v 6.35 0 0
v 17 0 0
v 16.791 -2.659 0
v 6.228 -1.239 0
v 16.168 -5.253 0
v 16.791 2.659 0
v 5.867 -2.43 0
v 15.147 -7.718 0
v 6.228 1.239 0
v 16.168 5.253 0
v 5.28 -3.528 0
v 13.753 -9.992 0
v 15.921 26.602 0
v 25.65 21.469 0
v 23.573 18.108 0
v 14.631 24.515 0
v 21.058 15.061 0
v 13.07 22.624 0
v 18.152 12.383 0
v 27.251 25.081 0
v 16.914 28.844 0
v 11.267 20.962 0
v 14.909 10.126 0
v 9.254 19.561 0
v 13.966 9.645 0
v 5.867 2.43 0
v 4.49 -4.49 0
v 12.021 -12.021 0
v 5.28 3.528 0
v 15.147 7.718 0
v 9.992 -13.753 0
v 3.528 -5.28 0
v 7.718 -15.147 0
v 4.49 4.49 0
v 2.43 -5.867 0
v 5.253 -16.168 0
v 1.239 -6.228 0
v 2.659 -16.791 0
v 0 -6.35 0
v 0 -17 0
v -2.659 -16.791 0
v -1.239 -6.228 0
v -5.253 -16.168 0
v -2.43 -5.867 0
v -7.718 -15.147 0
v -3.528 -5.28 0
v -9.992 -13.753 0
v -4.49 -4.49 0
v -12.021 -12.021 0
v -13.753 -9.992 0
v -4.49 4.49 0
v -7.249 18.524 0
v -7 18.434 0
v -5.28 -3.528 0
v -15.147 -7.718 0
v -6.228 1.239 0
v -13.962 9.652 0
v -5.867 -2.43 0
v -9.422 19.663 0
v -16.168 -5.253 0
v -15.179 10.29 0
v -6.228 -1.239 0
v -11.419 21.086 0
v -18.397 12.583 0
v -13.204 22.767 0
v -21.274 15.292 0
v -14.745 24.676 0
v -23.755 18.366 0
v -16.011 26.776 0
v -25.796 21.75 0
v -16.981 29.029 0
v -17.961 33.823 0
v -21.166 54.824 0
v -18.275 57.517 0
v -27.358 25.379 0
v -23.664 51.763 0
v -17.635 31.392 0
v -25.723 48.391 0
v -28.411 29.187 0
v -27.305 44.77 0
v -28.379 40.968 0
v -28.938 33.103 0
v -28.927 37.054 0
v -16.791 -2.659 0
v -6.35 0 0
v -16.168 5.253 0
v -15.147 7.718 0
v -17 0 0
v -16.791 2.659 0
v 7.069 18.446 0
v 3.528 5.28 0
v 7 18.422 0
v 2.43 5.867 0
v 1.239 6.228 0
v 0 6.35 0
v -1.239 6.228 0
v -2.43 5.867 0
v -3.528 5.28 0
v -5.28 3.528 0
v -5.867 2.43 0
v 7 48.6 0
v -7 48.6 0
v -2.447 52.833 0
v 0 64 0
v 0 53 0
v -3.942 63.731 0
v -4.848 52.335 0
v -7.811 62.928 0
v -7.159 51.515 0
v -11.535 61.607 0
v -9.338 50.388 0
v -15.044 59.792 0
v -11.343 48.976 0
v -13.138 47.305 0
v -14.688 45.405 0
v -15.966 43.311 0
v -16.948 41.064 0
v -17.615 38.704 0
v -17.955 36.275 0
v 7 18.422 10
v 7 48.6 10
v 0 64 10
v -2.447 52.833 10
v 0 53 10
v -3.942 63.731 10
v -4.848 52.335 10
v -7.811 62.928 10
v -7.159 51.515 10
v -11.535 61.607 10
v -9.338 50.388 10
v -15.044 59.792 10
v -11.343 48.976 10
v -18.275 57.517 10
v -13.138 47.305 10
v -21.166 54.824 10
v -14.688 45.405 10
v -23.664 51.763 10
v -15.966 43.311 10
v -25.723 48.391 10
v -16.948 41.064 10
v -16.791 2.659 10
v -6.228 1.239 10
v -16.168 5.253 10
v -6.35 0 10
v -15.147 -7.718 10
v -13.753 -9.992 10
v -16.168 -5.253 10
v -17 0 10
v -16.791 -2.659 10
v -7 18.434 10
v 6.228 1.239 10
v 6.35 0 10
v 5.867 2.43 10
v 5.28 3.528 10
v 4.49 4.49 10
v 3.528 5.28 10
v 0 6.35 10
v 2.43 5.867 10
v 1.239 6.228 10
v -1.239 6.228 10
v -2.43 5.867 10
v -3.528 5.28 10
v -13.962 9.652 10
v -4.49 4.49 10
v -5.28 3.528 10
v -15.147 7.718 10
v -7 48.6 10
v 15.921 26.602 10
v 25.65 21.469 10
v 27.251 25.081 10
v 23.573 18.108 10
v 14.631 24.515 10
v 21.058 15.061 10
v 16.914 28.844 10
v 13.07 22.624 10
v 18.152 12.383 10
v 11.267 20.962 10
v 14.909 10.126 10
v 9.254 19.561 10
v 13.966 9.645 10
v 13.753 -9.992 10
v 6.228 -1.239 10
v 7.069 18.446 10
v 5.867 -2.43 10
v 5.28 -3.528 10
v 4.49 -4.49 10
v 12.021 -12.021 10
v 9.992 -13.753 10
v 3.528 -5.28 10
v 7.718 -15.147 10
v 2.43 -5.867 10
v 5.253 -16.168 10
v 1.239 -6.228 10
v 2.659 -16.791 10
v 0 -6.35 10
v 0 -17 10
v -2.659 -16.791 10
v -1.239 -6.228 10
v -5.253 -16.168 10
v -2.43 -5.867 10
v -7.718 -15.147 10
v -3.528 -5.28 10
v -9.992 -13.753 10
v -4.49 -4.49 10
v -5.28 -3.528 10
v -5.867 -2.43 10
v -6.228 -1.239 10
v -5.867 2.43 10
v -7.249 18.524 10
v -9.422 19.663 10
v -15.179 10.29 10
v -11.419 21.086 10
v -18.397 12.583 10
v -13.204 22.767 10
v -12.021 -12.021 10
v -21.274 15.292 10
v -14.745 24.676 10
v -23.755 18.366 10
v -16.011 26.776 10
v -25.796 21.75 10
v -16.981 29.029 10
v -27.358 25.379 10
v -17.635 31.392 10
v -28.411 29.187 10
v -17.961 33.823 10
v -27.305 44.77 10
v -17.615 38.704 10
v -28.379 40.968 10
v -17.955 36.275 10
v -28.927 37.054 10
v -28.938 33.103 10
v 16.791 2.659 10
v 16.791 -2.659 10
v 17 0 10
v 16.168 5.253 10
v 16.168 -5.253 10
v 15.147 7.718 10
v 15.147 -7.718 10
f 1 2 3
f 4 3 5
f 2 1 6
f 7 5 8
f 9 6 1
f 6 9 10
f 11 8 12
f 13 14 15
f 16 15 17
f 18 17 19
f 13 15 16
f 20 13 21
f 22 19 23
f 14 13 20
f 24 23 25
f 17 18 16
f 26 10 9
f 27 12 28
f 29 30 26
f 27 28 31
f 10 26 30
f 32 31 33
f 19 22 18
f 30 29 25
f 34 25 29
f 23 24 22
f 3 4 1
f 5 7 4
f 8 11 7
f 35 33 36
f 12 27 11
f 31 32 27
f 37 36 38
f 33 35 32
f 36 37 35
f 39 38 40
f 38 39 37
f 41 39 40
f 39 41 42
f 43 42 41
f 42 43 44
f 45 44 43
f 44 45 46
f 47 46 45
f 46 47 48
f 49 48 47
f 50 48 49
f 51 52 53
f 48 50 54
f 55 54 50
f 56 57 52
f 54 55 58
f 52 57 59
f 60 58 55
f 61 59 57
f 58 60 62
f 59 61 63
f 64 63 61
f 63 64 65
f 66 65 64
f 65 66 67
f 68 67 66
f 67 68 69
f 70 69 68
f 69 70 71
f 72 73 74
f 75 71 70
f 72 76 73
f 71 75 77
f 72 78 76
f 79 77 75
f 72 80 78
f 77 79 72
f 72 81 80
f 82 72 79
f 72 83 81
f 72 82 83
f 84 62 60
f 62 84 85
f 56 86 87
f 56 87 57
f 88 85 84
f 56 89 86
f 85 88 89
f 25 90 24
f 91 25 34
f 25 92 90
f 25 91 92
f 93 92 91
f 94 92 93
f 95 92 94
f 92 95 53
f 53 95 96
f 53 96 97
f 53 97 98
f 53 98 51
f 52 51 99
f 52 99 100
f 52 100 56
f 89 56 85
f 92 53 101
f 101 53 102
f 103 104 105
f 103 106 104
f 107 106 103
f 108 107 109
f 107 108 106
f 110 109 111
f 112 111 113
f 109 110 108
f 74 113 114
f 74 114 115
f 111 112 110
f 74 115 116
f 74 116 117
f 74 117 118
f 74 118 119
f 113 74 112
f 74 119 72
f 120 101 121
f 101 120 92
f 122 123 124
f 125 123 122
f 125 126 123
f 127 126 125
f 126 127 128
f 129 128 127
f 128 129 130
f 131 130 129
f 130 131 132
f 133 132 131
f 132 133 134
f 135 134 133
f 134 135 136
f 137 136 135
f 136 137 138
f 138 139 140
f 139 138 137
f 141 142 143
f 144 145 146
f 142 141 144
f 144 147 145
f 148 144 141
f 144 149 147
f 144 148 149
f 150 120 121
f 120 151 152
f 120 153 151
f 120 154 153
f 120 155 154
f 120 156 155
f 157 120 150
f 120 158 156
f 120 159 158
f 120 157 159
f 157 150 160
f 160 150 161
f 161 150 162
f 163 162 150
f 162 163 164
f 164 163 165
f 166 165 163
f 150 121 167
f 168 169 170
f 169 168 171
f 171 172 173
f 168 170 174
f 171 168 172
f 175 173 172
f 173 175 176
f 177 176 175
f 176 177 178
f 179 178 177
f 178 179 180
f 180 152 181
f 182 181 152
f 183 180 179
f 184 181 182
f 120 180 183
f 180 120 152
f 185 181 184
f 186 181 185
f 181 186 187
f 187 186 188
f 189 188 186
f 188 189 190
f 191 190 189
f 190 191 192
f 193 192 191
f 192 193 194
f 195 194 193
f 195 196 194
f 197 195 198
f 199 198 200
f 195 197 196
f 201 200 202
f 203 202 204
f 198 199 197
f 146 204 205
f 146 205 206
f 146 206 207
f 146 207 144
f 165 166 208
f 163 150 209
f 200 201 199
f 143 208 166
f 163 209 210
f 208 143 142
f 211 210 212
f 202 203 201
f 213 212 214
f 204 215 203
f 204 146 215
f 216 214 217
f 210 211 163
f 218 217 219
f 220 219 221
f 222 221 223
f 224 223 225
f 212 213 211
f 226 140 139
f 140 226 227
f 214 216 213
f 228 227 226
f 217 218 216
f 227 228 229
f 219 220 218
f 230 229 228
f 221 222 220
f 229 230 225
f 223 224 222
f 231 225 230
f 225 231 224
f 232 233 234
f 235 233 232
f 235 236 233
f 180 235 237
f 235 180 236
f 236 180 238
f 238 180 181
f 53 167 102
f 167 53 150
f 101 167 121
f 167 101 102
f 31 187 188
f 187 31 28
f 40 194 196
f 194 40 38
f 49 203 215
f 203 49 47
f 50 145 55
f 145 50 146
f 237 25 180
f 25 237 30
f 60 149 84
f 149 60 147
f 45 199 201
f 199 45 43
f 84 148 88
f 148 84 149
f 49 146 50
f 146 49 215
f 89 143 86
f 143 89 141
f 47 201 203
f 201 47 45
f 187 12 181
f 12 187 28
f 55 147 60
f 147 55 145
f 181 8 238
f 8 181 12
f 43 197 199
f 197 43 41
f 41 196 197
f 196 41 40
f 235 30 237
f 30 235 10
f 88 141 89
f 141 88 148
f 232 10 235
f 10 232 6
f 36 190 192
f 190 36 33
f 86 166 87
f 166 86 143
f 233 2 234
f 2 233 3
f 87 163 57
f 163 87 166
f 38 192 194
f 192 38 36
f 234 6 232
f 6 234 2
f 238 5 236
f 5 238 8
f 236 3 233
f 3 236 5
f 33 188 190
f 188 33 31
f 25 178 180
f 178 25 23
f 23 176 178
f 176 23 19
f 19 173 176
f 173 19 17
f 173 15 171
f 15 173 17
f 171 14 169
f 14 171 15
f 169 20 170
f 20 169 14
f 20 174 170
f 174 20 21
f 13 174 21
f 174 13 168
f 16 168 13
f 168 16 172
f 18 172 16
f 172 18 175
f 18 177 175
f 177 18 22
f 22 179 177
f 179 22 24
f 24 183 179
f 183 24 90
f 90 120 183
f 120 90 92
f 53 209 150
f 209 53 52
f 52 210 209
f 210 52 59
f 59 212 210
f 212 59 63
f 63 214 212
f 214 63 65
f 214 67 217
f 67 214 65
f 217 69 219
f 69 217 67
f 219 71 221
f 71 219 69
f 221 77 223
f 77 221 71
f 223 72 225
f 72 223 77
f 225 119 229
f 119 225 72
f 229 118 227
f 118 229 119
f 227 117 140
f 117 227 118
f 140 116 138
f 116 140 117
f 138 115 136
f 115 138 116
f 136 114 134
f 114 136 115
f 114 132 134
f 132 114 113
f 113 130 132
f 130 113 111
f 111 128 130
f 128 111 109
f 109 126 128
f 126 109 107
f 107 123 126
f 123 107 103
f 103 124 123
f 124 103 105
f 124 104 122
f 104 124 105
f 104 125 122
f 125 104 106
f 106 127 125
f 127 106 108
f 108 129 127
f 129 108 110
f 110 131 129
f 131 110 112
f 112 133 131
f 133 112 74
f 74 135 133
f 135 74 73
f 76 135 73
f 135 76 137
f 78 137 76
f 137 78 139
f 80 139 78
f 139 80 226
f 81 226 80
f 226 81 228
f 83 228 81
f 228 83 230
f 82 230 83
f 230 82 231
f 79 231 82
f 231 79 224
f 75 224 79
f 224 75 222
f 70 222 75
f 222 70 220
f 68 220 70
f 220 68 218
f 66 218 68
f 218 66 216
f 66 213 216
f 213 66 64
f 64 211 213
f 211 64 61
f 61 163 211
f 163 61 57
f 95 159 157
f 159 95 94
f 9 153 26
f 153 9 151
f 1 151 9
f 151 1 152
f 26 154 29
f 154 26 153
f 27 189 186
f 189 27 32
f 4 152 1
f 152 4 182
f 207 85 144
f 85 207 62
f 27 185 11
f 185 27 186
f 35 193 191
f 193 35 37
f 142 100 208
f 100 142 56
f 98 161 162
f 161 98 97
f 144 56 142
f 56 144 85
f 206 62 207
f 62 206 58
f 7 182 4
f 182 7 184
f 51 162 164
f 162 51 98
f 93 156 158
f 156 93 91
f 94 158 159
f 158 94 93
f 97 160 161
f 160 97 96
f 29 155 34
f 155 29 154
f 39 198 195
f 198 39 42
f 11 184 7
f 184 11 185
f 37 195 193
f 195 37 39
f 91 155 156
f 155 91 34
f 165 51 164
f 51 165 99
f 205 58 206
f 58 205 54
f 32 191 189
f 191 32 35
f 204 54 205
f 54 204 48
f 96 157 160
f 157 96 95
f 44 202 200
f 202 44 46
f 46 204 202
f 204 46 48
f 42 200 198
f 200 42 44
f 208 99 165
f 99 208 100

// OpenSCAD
$fn = 32;

// ----------------------------------------------------------------------
// Hook: 70 mm shank into a 18 mm curl, 10 mm thick
// ----------------------------------------------------------------------

// --- parameters (mm) ---
shank_len = 70;           // shank length from the boss centre
shank_w = 14;             // shank width
boss_d = 34;              // boss diameter
bore_d = 12.7;            // boss bore
curl_in = 18;             // curl inner radius
curl_out = 29;            // curl outer radius
curl_sweep = 250;         // curl sweep angle
hook_t = 10;              // hook thickness

shank_profile = [[-7, 48.6], [7, 48.6], [7, 15], [-7, 15]];
boss_profile = [[17, 0], [16.791, 2.659], [16.168, 5.253], [15.147, 7.718], [13.753, 9.992], [12.021, 12.021], [9.992, 13.753], [7.718, 15.147], [5.253, 16.168], [2.659, 16.791], [0, 17], [-2.659, 16.791], [-5.253, 16.168], [-7.718, 15.147], [-9.992, 13.753], [-12.021, 12.021], [-13.753, 9.992], [-15.147, 7.718], [-16.168, 5.253], [-16.791, 2.659], [-17, 0], [-16.791, -2.659], [-16.168, -5.253], [-15.147, -7.718], [-13.753, -9.992], [-12.021, -12.021], [-9.992, -13.753], [-7.718, -15.147], [-5.253, -16.168], [-2.659, -16.791], [0, -17], [2.659, -16.791], [5.253, -16.168], [7.718, -15.147], [9.992, -13.753], [12.021, -12.021], [13.753, -9.992], [15.147, -7.718], [16.168, -5.253], [16.791, -2.659]];
curl_profile = [[0, 64], [-3.942, 63.731], [-7.811, 62.928], [-11.535, 61.607], [-15.044, 59.792], [-18.275, 57.517], [-21.166, 54.824], [-23.664, 51.763], [-25.723, 48.391], [-27.305, 44.77], [-28.379, 40.968], [-28.927, 37.054], [-28.938, 33.103], [-28.411, 29.187], [-27.358, 25.379], [-25.796, 21.75], [-23.755, 18.366], [-21.274, 15.292], [-18.397, 12.583], [-15.179, 10.29], [-11.68, 8.456], [-7.963, 7.115], [-4.099, 6.291], [-0.158, 6], [3.785, 6.248], [7.658, 7.03], [11.389, 8.33], [14.909, 10.126], [18.152, 12.383], [21.058, 15.061], [23.573, 18.108], [25.65, 21.469], [27.251, 25.081], [16.914, 28.844], [15.921, 26.602], [14.631, 24.515], [13.07, 22.624], [11.267, 20.962], [9.254, 19.561], [7.069, 18.446], [4.754, 17.639], [2.349, 17.154], [-0.098, 17], [-2.544, 17.181], [-4.943, 17.692], [-7.249, 18.524], [-9.422, 19.663], [-11.419, 21.086], [-13.204, 22.767], [-14.745, 24.676], [-16.011, 26.776], [-16.981, 29.029], [-17.635, 31.392], [-17.961, 33.823], [-17.955, 36.275], [-17.615, 38.704], [-16.948, 41.064], [-15.966, 43.311], [-14.688, 45.405], [-13.138, 47.305], [-11.343, 48.976], [-9.338, 50.388], [-7.159, 51.515], [-4.848, 52.335], [-2.447, 52.833], [0, 53]];

difference() {
  union() {
    /* three overlapping outlines: shank, boss and the smooth curl */
    linear_extrude(height = hook_t) polygon(shank_profile);
    linear_extrude(height = hook_t) polygon(boss_profile);
    linear_extrude(height = hook_t) polygon(curl_profile);
  }
  translate([0, 0, -2.5]) cylinder(h = hook_t + 5, d = bore_d);
}
